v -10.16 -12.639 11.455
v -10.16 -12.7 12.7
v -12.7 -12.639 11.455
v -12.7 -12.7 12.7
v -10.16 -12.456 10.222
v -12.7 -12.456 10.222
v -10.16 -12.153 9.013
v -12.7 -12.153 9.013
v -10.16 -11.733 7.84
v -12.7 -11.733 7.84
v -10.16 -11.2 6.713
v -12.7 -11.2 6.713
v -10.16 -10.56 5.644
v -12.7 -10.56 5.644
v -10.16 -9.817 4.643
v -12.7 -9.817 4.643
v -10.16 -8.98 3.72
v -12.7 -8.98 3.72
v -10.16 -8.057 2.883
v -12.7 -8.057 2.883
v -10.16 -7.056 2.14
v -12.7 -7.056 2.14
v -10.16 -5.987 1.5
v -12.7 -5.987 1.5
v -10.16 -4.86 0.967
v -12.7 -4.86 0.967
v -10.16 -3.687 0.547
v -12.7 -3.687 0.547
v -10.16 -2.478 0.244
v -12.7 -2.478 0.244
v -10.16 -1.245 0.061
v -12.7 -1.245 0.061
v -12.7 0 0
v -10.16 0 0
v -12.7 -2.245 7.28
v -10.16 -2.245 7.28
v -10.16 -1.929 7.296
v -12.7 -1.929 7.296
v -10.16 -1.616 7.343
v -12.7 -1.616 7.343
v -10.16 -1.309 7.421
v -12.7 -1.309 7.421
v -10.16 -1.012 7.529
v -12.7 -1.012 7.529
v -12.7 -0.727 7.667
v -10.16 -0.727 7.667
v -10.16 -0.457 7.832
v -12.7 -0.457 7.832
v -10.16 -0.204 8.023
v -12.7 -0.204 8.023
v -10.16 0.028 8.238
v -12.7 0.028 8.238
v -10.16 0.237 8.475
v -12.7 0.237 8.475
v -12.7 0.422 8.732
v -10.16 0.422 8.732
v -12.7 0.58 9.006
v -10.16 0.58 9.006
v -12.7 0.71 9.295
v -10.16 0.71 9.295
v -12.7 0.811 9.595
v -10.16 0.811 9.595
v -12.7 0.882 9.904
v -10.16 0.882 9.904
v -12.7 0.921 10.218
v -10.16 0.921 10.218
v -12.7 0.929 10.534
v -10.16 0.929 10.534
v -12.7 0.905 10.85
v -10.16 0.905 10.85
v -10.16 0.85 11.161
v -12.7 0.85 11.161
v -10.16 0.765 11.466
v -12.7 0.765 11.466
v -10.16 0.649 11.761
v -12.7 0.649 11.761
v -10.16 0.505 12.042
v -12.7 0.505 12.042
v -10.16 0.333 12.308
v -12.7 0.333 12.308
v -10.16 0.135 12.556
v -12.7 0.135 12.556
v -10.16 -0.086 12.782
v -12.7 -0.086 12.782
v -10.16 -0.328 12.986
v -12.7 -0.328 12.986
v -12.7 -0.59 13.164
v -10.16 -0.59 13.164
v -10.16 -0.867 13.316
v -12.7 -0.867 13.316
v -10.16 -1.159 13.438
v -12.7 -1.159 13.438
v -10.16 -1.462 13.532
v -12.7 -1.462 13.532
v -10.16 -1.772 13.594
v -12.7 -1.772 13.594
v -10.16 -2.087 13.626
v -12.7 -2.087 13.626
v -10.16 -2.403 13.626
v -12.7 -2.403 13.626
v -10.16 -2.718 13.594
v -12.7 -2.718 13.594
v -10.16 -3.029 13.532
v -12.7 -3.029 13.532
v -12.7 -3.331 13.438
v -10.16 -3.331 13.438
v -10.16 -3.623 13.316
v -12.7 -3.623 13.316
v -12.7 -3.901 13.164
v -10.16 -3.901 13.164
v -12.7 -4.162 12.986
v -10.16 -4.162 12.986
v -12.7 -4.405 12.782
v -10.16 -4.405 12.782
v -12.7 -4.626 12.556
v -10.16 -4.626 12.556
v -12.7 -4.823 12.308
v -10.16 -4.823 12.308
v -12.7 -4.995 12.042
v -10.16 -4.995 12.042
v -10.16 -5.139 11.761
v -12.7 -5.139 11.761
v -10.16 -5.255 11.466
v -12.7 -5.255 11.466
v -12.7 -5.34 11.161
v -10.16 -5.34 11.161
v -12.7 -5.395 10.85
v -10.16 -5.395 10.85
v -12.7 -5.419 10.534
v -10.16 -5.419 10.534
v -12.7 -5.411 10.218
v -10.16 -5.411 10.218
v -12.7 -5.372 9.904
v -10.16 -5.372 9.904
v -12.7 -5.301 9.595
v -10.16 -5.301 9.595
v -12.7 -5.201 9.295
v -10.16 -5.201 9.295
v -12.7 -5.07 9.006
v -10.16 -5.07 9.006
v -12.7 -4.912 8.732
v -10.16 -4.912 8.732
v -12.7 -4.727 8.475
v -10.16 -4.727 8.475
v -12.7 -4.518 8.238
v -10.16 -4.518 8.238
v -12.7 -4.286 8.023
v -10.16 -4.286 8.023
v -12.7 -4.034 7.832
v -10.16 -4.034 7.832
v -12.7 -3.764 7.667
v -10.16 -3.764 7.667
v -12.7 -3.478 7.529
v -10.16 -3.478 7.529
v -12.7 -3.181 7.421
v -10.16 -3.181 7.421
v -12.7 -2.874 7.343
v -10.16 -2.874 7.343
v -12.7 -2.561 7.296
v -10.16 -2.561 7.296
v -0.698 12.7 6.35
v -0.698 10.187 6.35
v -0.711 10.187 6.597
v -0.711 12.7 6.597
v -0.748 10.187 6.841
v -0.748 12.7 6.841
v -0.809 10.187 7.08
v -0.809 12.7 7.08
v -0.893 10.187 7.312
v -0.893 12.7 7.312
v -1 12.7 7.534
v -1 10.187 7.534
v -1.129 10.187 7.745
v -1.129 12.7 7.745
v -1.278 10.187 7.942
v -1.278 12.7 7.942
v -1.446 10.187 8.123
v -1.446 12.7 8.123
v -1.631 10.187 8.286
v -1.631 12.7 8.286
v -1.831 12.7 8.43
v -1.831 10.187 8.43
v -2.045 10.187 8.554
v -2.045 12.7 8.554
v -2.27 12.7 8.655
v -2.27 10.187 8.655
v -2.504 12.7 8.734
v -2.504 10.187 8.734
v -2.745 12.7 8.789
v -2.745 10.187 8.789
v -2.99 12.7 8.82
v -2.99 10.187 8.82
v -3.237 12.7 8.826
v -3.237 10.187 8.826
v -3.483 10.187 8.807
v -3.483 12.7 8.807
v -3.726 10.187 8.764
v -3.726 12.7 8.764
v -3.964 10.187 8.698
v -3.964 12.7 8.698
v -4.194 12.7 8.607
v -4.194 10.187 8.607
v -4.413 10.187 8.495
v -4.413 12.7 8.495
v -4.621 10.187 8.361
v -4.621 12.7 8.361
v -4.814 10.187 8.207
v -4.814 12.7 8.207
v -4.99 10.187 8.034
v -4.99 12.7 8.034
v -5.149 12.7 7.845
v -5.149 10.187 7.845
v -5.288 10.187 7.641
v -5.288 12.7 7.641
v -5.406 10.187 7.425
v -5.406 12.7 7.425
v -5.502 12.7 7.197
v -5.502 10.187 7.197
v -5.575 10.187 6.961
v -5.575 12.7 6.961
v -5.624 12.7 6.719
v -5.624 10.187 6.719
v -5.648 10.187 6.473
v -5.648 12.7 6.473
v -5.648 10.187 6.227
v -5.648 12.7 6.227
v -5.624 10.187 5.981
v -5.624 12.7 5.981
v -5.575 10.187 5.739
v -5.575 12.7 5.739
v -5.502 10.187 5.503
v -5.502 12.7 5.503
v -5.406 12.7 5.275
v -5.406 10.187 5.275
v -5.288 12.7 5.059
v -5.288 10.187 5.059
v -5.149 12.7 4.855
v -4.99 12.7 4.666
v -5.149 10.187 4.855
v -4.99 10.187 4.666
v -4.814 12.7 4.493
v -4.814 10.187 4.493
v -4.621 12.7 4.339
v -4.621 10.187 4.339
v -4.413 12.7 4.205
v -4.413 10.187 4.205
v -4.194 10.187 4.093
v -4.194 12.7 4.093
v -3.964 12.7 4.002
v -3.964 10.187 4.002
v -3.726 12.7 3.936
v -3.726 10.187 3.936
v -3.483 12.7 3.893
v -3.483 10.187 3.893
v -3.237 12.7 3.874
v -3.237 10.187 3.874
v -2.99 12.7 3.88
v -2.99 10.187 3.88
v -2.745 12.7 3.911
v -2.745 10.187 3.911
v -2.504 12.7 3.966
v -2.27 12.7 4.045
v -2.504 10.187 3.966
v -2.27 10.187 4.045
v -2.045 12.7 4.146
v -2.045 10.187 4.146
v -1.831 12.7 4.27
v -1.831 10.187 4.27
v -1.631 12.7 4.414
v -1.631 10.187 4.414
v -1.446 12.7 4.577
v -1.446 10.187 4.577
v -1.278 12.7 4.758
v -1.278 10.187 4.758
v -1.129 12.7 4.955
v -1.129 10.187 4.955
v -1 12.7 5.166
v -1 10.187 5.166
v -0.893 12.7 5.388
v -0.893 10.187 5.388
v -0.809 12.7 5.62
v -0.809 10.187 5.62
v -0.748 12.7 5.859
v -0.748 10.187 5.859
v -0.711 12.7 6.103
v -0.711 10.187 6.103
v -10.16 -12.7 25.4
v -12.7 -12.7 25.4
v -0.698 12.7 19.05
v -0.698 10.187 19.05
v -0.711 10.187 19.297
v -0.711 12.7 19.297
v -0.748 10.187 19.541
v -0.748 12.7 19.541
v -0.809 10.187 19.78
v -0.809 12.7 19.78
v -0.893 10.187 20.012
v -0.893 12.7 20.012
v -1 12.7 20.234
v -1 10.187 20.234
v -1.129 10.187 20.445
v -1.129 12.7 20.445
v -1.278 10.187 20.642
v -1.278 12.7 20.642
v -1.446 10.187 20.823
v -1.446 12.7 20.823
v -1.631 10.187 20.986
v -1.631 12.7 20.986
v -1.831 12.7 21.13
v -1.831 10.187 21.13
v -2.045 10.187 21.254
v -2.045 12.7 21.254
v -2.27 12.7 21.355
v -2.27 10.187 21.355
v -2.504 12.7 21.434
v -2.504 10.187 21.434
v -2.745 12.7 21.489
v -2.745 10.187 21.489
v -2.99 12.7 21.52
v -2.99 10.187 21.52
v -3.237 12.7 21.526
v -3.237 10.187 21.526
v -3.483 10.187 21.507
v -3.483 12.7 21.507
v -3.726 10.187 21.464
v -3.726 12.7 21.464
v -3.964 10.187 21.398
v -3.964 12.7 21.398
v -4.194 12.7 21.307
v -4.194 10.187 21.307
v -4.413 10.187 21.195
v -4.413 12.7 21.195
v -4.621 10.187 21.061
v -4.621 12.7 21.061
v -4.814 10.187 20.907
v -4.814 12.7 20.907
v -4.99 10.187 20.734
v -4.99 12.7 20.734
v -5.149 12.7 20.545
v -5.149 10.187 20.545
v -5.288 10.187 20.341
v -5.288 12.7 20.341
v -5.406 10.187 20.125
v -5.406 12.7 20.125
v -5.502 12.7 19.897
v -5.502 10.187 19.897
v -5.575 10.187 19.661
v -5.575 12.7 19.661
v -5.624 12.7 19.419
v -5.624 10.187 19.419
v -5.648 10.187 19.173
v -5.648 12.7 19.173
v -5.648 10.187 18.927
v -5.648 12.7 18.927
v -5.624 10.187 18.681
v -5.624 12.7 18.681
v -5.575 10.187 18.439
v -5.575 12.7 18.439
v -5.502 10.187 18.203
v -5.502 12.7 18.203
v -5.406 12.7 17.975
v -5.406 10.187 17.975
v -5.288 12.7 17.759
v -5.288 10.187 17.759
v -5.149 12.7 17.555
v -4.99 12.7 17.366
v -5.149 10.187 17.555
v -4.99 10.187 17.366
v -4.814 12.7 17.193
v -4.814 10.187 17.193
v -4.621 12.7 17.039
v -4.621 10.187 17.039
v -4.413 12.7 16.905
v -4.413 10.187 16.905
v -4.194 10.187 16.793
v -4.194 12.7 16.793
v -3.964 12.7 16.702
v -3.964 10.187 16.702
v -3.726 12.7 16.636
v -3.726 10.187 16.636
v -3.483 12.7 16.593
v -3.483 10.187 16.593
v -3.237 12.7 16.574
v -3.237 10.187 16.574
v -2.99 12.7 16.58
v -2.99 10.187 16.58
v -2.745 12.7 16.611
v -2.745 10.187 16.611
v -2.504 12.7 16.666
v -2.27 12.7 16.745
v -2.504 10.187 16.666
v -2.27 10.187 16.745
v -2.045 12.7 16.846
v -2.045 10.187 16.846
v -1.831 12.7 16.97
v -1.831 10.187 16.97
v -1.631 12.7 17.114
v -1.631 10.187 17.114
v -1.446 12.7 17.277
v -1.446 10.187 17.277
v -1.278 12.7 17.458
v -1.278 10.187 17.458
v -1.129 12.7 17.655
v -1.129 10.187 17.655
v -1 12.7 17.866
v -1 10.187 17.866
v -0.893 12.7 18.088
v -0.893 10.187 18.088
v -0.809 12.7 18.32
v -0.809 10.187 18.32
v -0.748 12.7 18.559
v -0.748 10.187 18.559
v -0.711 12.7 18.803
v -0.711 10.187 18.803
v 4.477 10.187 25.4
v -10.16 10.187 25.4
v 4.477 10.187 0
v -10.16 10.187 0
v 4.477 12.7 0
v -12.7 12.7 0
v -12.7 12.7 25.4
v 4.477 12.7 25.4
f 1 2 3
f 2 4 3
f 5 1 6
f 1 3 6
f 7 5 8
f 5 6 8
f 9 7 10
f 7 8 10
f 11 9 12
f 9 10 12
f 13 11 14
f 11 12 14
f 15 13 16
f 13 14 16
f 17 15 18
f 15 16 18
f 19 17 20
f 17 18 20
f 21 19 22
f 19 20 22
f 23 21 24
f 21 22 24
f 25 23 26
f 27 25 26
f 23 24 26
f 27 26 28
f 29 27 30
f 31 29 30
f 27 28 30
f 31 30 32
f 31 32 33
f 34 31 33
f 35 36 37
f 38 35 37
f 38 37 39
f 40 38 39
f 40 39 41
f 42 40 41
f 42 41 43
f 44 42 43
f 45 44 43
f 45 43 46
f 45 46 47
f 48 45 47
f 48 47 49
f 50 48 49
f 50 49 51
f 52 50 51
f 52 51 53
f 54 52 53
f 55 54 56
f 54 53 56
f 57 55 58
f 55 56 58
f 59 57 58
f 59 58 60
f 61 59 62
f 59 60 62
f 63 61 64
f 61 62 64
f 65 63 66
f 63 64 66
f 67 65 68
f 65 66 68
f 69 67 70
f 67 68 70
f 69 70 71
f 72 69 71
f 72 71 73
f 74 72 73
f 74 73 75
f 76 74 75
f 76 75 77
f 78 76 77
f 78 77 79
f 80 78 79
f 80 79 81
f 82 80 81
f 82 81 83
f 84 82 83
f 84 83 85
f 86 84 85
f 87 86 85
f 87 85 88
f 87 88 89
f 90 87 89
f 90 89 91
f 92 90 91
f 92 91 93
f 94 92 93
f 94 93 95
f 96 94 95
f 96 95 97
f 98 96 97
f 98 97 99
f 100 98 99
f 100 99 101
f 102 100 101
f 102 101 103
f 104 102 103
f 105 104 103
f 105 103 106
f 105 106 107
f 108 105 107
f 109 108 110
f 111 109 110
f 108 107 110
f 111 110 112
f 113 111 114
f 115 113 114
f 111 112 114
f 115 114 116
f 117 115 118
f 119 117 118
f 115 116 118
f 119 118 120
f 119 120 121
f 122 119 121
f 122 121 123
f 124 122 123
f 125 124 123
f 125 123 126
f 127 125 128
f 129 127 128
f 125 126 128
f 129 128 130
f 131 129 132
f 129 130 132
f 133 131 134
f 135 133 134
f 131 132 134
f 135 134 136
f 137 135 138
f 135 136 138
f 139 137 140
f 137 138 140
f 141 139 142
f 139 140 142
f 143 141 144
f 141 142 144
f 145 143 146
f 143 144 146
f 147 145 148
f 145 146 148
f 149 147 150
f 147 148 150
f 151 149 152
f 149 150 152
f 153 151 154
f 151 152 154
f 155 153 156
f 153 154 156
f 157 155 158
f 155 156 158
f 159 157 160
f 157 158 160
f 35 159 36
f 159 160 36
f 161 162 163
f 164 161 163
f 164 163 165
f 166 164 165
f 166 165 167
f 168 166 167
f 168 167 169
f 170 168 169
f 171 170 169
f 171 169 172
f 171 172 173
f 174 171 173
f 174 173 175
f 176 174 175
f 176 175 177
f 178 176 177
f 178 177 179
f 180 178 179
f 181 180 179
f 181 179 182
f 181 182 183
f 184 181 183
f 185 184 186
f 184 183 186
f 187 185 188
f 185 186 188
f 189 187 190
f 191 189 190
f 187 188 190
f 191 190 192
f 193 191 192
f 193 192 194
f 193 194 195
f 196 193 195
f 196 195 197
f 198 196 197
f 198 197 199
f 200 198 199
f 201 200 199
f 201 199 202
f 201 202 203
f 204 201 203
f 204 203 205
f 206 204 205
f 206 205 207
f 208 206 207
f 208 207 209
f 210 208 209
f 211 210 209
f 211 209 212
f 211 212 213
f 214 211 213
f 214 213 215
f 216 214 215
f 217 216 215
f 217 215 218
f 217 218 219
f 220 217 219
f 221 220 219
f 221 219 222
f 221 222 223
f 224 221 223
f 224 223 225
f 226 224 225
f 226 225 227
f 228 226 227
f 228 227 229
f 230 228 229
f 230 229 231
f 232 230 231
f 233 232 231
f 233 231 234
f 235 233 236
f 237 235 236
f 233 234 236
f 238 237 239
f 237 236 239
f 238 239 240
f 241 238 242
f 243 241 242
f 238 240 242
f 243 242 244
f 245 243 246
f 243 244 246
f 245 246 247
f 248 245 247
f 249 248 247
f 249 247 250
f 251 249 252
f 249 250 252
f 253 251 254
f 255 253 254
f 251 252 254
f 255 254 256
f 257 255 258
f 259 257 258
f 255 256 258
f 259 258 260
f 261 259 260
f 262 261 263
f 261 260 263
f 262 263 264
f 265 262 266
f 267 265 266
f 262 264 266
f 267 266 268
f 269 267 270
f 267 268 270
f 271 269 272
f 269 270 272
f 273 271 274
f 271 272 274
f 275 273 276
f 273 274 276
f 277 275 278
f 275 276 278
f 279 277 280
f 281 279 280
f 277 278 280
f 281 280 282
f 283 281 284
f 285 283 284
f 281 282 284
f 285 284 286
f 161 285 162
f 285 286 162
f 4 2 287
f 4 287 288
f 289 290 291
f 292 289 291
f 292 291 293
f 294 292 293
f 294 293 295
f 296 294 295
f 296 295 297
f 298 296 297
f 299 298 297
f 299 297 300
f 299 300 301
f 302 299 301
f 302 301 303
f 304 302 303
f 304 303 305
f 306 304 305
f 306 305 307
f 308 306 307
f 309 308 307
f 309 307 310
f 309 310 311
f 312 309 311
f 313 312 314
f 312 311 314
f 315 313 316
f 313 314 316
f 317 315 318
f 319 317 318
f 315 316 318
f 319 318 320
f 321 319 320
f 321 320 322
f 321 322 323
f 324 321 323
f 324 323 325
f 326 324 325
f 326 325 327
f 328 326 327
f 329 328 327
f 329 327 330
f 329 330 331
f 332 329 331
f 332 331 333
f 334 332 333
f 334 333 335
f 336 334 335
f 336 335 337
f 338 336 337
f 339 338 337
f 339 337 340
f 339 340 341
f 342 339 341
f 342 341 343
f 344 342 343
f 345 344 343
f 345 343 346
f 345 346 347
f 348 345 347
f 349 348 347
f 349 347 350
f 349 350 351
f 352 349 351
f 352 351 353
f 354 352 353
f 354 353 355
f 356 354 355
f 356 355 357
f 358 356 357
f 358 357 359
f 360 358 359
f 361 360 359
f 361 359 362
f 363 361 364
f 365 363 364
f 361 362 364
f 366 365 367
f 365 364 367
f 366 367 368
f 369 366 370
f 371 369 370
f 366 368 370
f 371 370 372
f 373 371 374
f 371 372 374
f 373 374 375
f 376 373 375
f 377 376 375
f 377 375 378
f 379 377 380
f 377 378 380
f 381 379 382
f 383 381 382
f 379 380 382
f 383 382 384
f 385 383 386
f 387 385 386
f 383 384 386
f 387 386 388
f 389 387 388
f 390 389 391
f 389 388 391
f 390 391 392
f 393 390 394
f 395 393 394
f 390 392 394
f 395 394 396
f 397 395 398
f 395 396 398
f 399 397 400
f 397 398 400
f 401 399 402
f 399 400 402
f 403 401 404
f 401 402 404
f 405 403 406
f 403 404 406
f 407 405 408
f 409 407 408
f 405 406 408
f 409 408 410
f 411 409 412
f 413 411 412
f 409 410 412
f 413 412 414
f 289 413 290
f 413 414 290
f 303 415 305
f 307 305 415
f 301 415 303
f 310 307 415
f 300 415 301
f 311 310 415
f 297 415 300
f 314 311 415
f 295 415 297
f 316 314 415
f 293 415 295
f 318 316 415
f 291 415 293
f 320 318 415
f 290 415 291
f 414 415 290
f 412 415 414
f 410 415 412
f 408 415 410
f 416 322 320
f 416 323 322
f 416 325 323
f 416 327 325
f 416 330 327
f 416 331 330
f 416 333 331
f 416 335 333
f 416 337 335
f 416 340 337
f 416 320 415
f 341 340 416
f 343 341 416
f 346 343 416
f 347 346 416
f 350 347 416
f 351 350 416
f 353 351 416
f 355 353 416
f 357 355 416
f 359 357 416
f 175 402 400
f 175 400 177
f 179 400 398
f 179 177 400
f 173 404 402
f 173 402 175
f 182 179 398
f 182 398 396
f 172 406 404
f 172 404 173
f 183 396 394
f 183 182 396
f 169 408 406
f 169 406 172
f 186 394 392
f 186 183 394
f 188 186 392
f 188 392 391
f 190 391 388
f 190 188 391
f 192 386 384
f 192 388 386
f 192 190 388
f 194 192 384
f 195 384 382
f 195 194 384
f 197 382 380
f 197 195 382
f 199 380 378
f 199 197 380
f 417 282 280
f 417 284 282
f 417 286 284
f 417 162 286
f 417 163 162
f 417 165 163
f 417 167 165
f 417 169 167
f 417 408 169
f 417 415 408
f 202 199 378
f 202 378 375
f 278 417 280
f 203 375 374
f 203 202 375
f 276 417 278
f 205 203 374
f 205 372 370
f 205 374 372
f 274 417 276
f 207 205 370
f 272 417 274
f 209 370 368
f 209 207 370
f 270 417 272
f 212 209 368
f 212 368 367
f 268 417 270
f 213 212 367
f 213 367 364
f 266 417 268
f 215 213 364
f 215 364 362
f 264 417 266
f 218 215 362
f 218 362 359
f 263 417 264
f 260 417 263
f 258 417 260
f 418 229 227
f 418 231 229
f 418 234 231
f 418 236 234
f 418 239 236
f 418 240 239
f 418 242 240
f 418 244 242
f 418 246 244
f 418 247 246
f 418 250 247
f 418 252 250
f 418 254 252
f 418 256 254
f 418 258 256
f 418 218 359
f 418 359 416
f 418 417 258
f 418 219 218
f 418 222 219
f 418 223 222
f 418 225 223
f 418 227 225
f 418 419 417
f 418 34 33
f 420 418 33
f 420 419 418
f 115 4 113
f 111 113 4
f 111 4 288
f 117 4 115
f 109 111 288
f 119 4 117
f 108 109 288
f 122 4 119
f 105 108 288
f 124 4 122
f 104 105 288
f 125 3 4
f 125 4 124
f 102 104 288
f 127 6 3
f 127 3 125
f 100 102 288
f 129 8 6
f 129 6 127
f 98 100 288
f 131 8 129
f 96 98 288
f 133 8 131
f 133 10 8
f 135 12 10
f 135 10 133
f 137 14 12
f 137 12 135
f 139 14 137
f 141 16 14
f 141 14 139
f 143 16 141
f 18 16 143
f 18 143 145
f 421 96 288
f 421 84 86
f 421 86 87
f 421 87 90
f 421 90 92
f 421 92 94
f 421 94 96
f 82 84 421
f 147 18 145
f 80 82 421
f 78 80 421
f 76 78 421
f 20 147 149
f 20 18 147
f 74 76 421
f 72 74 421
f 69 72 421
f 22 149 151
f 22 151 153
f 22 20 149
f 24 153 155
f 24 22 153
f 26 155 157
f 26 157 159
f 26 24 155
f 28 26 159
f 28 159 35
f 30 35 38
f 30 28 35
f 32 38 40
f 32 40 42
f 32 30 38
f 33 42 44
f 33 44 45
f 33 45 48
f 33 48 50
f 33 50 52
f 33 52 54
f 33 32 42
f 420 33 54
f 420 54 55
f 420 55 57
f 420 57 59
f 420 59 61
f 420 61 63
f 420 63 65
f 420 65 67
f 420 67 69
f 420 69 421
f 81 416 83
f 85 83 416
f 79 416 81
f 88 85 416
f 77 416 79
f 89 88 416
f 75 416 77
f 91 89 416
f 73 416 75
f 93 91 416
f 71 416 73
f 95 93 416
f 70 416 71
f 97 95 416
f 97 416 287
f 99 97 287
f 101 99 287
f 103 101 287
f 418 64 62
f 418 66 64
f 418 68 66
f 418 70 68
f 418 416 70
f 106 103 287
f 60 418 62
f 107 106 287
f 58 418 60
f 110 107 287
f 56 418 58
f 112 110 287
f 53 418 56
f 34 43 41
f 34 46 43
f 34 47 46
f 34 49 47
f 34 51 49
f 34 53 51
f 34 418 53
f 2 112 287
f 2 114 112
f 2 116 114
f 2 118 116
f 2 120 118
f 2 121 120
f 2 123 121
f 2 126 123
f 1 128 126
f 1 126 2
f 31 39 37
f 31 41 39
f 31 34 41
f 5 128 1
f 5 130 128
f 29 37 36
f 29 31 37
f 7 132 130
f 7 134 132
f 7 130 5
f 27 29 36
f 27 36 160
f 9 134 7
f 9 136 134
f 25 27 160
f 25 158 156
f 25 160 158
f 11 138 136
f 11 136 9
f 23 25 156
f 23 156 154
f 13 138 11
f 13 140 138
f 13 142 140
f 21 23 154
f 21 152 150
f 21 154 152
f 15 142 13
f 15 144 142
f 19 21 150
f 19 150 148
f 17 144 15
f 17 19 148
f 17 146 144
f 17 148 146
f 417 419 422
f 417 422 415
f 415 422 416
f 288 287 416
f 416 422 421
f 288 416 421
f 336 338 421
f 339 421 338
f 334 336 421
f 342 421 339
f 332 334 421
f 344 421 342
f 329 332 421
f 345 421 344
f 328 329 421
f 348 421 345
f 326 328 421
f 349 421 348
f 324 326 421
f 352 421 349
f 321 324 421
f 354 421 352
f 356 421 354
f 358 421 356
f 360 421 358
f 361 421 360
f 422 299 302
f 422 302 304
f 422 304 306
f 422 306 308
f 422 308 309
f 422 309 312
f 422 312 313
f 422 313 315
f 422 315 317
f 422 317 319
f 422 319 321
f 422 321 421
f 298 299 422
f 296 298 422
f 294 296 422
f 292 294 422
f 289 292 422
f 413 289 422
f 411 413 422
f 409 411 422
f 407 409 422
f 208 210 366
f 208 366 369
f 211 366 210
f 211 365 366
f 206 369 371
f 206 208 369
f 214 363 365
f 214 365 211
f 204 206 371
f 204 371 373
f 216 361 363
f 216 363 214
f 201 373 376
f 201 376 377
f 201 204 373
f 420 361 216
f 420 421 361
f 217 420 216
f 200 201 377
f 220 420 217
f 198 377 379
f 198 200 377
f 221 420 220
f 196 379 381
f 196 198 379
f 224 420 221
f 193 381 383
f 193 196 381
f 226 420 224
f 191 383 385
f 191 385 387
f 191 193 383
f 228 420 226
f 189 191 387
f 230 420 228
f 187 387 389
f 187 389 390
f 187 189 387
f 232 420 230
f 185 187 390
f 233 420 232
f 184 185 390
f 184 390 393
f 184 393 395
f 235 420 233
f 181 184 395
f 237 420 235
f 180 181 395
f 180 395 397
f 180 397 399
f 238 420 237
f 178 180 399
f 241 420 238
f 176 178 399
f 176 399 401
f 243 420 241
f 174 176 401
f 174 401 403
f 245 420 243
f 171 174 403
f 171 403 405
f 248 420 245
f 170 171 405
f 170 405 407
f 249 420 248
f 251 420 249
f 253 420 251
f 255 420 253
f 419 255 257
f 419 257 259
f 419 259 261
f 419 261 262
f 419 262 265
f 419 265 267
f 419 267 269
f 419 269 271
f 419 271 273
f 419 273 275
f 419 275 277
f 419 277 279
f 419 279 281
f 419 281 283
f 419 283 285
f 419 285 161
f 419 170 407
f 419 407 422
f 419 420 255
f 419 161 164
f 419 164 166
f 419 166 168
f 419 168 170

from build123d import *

# Parameters (mm, degrees)
BOSS_EXTRUDE1_DEPTH = 25.4
FILLET1_R           = 12.7
SKETCH2_R           = 3.175
CUT_EXTRUDE1_DEPTH  = 3.54
SKETCH3_R           = 2.4765
CUT_EXTRUDE2_DEPTH  = 3.512939161


with BuildPart() as part:
    # Sketch1 → Boss-Extrude1 (new body)
    with BuildSketch(Plane.XY):
        Polygon((-12.7, -12.7), (-12.7, 12.7), (4.47675, 12.7), (4.47675, 10.187060839), (-10.16, 10.187060839), (-10.16, -12.7), align=None)
    extrude(amount=BOSS_EXTRUDE1_DEPTH)

    # Fillet1
    fillet1_edges = [part.edges().sort_by_distance(p)[0] for p in [
        (-11.43, -12.7, 0),
    ]]
    fillet(fillet1_edges, radius=FILLET1_R)

    # Sketch2 → Cut-Extrude1 (cut, through all)
    with BuildSketch(Plane(origin=(-10.16, 0, 0), x_dir=(0, 0, -1), z_dir=(1, 0, 0))):
        with Locations((-10.45493597, -2.24506403)):
            Circle(SKETCH2_R)
    extrude(amount=-CUT_EXTRUDE1_DEPTH, mode=Mode.SUBTRACT)

    # Sketch3 → Cut-Extrude2 (cut, through all)
    with BuildSketch(Plane.XZ.offset(-10.187060839)):
        with Locations((-3.175, 19.05)):
            Circle(SKETCH3_R)
        with Locations((-3.175, 6.35)):
            Circle(SKETCH3_R)
    extrude(amount=-CUT_EXTRUDE2_DEPTH, mode=Mode.SUBTRACT)


solid = part.part
